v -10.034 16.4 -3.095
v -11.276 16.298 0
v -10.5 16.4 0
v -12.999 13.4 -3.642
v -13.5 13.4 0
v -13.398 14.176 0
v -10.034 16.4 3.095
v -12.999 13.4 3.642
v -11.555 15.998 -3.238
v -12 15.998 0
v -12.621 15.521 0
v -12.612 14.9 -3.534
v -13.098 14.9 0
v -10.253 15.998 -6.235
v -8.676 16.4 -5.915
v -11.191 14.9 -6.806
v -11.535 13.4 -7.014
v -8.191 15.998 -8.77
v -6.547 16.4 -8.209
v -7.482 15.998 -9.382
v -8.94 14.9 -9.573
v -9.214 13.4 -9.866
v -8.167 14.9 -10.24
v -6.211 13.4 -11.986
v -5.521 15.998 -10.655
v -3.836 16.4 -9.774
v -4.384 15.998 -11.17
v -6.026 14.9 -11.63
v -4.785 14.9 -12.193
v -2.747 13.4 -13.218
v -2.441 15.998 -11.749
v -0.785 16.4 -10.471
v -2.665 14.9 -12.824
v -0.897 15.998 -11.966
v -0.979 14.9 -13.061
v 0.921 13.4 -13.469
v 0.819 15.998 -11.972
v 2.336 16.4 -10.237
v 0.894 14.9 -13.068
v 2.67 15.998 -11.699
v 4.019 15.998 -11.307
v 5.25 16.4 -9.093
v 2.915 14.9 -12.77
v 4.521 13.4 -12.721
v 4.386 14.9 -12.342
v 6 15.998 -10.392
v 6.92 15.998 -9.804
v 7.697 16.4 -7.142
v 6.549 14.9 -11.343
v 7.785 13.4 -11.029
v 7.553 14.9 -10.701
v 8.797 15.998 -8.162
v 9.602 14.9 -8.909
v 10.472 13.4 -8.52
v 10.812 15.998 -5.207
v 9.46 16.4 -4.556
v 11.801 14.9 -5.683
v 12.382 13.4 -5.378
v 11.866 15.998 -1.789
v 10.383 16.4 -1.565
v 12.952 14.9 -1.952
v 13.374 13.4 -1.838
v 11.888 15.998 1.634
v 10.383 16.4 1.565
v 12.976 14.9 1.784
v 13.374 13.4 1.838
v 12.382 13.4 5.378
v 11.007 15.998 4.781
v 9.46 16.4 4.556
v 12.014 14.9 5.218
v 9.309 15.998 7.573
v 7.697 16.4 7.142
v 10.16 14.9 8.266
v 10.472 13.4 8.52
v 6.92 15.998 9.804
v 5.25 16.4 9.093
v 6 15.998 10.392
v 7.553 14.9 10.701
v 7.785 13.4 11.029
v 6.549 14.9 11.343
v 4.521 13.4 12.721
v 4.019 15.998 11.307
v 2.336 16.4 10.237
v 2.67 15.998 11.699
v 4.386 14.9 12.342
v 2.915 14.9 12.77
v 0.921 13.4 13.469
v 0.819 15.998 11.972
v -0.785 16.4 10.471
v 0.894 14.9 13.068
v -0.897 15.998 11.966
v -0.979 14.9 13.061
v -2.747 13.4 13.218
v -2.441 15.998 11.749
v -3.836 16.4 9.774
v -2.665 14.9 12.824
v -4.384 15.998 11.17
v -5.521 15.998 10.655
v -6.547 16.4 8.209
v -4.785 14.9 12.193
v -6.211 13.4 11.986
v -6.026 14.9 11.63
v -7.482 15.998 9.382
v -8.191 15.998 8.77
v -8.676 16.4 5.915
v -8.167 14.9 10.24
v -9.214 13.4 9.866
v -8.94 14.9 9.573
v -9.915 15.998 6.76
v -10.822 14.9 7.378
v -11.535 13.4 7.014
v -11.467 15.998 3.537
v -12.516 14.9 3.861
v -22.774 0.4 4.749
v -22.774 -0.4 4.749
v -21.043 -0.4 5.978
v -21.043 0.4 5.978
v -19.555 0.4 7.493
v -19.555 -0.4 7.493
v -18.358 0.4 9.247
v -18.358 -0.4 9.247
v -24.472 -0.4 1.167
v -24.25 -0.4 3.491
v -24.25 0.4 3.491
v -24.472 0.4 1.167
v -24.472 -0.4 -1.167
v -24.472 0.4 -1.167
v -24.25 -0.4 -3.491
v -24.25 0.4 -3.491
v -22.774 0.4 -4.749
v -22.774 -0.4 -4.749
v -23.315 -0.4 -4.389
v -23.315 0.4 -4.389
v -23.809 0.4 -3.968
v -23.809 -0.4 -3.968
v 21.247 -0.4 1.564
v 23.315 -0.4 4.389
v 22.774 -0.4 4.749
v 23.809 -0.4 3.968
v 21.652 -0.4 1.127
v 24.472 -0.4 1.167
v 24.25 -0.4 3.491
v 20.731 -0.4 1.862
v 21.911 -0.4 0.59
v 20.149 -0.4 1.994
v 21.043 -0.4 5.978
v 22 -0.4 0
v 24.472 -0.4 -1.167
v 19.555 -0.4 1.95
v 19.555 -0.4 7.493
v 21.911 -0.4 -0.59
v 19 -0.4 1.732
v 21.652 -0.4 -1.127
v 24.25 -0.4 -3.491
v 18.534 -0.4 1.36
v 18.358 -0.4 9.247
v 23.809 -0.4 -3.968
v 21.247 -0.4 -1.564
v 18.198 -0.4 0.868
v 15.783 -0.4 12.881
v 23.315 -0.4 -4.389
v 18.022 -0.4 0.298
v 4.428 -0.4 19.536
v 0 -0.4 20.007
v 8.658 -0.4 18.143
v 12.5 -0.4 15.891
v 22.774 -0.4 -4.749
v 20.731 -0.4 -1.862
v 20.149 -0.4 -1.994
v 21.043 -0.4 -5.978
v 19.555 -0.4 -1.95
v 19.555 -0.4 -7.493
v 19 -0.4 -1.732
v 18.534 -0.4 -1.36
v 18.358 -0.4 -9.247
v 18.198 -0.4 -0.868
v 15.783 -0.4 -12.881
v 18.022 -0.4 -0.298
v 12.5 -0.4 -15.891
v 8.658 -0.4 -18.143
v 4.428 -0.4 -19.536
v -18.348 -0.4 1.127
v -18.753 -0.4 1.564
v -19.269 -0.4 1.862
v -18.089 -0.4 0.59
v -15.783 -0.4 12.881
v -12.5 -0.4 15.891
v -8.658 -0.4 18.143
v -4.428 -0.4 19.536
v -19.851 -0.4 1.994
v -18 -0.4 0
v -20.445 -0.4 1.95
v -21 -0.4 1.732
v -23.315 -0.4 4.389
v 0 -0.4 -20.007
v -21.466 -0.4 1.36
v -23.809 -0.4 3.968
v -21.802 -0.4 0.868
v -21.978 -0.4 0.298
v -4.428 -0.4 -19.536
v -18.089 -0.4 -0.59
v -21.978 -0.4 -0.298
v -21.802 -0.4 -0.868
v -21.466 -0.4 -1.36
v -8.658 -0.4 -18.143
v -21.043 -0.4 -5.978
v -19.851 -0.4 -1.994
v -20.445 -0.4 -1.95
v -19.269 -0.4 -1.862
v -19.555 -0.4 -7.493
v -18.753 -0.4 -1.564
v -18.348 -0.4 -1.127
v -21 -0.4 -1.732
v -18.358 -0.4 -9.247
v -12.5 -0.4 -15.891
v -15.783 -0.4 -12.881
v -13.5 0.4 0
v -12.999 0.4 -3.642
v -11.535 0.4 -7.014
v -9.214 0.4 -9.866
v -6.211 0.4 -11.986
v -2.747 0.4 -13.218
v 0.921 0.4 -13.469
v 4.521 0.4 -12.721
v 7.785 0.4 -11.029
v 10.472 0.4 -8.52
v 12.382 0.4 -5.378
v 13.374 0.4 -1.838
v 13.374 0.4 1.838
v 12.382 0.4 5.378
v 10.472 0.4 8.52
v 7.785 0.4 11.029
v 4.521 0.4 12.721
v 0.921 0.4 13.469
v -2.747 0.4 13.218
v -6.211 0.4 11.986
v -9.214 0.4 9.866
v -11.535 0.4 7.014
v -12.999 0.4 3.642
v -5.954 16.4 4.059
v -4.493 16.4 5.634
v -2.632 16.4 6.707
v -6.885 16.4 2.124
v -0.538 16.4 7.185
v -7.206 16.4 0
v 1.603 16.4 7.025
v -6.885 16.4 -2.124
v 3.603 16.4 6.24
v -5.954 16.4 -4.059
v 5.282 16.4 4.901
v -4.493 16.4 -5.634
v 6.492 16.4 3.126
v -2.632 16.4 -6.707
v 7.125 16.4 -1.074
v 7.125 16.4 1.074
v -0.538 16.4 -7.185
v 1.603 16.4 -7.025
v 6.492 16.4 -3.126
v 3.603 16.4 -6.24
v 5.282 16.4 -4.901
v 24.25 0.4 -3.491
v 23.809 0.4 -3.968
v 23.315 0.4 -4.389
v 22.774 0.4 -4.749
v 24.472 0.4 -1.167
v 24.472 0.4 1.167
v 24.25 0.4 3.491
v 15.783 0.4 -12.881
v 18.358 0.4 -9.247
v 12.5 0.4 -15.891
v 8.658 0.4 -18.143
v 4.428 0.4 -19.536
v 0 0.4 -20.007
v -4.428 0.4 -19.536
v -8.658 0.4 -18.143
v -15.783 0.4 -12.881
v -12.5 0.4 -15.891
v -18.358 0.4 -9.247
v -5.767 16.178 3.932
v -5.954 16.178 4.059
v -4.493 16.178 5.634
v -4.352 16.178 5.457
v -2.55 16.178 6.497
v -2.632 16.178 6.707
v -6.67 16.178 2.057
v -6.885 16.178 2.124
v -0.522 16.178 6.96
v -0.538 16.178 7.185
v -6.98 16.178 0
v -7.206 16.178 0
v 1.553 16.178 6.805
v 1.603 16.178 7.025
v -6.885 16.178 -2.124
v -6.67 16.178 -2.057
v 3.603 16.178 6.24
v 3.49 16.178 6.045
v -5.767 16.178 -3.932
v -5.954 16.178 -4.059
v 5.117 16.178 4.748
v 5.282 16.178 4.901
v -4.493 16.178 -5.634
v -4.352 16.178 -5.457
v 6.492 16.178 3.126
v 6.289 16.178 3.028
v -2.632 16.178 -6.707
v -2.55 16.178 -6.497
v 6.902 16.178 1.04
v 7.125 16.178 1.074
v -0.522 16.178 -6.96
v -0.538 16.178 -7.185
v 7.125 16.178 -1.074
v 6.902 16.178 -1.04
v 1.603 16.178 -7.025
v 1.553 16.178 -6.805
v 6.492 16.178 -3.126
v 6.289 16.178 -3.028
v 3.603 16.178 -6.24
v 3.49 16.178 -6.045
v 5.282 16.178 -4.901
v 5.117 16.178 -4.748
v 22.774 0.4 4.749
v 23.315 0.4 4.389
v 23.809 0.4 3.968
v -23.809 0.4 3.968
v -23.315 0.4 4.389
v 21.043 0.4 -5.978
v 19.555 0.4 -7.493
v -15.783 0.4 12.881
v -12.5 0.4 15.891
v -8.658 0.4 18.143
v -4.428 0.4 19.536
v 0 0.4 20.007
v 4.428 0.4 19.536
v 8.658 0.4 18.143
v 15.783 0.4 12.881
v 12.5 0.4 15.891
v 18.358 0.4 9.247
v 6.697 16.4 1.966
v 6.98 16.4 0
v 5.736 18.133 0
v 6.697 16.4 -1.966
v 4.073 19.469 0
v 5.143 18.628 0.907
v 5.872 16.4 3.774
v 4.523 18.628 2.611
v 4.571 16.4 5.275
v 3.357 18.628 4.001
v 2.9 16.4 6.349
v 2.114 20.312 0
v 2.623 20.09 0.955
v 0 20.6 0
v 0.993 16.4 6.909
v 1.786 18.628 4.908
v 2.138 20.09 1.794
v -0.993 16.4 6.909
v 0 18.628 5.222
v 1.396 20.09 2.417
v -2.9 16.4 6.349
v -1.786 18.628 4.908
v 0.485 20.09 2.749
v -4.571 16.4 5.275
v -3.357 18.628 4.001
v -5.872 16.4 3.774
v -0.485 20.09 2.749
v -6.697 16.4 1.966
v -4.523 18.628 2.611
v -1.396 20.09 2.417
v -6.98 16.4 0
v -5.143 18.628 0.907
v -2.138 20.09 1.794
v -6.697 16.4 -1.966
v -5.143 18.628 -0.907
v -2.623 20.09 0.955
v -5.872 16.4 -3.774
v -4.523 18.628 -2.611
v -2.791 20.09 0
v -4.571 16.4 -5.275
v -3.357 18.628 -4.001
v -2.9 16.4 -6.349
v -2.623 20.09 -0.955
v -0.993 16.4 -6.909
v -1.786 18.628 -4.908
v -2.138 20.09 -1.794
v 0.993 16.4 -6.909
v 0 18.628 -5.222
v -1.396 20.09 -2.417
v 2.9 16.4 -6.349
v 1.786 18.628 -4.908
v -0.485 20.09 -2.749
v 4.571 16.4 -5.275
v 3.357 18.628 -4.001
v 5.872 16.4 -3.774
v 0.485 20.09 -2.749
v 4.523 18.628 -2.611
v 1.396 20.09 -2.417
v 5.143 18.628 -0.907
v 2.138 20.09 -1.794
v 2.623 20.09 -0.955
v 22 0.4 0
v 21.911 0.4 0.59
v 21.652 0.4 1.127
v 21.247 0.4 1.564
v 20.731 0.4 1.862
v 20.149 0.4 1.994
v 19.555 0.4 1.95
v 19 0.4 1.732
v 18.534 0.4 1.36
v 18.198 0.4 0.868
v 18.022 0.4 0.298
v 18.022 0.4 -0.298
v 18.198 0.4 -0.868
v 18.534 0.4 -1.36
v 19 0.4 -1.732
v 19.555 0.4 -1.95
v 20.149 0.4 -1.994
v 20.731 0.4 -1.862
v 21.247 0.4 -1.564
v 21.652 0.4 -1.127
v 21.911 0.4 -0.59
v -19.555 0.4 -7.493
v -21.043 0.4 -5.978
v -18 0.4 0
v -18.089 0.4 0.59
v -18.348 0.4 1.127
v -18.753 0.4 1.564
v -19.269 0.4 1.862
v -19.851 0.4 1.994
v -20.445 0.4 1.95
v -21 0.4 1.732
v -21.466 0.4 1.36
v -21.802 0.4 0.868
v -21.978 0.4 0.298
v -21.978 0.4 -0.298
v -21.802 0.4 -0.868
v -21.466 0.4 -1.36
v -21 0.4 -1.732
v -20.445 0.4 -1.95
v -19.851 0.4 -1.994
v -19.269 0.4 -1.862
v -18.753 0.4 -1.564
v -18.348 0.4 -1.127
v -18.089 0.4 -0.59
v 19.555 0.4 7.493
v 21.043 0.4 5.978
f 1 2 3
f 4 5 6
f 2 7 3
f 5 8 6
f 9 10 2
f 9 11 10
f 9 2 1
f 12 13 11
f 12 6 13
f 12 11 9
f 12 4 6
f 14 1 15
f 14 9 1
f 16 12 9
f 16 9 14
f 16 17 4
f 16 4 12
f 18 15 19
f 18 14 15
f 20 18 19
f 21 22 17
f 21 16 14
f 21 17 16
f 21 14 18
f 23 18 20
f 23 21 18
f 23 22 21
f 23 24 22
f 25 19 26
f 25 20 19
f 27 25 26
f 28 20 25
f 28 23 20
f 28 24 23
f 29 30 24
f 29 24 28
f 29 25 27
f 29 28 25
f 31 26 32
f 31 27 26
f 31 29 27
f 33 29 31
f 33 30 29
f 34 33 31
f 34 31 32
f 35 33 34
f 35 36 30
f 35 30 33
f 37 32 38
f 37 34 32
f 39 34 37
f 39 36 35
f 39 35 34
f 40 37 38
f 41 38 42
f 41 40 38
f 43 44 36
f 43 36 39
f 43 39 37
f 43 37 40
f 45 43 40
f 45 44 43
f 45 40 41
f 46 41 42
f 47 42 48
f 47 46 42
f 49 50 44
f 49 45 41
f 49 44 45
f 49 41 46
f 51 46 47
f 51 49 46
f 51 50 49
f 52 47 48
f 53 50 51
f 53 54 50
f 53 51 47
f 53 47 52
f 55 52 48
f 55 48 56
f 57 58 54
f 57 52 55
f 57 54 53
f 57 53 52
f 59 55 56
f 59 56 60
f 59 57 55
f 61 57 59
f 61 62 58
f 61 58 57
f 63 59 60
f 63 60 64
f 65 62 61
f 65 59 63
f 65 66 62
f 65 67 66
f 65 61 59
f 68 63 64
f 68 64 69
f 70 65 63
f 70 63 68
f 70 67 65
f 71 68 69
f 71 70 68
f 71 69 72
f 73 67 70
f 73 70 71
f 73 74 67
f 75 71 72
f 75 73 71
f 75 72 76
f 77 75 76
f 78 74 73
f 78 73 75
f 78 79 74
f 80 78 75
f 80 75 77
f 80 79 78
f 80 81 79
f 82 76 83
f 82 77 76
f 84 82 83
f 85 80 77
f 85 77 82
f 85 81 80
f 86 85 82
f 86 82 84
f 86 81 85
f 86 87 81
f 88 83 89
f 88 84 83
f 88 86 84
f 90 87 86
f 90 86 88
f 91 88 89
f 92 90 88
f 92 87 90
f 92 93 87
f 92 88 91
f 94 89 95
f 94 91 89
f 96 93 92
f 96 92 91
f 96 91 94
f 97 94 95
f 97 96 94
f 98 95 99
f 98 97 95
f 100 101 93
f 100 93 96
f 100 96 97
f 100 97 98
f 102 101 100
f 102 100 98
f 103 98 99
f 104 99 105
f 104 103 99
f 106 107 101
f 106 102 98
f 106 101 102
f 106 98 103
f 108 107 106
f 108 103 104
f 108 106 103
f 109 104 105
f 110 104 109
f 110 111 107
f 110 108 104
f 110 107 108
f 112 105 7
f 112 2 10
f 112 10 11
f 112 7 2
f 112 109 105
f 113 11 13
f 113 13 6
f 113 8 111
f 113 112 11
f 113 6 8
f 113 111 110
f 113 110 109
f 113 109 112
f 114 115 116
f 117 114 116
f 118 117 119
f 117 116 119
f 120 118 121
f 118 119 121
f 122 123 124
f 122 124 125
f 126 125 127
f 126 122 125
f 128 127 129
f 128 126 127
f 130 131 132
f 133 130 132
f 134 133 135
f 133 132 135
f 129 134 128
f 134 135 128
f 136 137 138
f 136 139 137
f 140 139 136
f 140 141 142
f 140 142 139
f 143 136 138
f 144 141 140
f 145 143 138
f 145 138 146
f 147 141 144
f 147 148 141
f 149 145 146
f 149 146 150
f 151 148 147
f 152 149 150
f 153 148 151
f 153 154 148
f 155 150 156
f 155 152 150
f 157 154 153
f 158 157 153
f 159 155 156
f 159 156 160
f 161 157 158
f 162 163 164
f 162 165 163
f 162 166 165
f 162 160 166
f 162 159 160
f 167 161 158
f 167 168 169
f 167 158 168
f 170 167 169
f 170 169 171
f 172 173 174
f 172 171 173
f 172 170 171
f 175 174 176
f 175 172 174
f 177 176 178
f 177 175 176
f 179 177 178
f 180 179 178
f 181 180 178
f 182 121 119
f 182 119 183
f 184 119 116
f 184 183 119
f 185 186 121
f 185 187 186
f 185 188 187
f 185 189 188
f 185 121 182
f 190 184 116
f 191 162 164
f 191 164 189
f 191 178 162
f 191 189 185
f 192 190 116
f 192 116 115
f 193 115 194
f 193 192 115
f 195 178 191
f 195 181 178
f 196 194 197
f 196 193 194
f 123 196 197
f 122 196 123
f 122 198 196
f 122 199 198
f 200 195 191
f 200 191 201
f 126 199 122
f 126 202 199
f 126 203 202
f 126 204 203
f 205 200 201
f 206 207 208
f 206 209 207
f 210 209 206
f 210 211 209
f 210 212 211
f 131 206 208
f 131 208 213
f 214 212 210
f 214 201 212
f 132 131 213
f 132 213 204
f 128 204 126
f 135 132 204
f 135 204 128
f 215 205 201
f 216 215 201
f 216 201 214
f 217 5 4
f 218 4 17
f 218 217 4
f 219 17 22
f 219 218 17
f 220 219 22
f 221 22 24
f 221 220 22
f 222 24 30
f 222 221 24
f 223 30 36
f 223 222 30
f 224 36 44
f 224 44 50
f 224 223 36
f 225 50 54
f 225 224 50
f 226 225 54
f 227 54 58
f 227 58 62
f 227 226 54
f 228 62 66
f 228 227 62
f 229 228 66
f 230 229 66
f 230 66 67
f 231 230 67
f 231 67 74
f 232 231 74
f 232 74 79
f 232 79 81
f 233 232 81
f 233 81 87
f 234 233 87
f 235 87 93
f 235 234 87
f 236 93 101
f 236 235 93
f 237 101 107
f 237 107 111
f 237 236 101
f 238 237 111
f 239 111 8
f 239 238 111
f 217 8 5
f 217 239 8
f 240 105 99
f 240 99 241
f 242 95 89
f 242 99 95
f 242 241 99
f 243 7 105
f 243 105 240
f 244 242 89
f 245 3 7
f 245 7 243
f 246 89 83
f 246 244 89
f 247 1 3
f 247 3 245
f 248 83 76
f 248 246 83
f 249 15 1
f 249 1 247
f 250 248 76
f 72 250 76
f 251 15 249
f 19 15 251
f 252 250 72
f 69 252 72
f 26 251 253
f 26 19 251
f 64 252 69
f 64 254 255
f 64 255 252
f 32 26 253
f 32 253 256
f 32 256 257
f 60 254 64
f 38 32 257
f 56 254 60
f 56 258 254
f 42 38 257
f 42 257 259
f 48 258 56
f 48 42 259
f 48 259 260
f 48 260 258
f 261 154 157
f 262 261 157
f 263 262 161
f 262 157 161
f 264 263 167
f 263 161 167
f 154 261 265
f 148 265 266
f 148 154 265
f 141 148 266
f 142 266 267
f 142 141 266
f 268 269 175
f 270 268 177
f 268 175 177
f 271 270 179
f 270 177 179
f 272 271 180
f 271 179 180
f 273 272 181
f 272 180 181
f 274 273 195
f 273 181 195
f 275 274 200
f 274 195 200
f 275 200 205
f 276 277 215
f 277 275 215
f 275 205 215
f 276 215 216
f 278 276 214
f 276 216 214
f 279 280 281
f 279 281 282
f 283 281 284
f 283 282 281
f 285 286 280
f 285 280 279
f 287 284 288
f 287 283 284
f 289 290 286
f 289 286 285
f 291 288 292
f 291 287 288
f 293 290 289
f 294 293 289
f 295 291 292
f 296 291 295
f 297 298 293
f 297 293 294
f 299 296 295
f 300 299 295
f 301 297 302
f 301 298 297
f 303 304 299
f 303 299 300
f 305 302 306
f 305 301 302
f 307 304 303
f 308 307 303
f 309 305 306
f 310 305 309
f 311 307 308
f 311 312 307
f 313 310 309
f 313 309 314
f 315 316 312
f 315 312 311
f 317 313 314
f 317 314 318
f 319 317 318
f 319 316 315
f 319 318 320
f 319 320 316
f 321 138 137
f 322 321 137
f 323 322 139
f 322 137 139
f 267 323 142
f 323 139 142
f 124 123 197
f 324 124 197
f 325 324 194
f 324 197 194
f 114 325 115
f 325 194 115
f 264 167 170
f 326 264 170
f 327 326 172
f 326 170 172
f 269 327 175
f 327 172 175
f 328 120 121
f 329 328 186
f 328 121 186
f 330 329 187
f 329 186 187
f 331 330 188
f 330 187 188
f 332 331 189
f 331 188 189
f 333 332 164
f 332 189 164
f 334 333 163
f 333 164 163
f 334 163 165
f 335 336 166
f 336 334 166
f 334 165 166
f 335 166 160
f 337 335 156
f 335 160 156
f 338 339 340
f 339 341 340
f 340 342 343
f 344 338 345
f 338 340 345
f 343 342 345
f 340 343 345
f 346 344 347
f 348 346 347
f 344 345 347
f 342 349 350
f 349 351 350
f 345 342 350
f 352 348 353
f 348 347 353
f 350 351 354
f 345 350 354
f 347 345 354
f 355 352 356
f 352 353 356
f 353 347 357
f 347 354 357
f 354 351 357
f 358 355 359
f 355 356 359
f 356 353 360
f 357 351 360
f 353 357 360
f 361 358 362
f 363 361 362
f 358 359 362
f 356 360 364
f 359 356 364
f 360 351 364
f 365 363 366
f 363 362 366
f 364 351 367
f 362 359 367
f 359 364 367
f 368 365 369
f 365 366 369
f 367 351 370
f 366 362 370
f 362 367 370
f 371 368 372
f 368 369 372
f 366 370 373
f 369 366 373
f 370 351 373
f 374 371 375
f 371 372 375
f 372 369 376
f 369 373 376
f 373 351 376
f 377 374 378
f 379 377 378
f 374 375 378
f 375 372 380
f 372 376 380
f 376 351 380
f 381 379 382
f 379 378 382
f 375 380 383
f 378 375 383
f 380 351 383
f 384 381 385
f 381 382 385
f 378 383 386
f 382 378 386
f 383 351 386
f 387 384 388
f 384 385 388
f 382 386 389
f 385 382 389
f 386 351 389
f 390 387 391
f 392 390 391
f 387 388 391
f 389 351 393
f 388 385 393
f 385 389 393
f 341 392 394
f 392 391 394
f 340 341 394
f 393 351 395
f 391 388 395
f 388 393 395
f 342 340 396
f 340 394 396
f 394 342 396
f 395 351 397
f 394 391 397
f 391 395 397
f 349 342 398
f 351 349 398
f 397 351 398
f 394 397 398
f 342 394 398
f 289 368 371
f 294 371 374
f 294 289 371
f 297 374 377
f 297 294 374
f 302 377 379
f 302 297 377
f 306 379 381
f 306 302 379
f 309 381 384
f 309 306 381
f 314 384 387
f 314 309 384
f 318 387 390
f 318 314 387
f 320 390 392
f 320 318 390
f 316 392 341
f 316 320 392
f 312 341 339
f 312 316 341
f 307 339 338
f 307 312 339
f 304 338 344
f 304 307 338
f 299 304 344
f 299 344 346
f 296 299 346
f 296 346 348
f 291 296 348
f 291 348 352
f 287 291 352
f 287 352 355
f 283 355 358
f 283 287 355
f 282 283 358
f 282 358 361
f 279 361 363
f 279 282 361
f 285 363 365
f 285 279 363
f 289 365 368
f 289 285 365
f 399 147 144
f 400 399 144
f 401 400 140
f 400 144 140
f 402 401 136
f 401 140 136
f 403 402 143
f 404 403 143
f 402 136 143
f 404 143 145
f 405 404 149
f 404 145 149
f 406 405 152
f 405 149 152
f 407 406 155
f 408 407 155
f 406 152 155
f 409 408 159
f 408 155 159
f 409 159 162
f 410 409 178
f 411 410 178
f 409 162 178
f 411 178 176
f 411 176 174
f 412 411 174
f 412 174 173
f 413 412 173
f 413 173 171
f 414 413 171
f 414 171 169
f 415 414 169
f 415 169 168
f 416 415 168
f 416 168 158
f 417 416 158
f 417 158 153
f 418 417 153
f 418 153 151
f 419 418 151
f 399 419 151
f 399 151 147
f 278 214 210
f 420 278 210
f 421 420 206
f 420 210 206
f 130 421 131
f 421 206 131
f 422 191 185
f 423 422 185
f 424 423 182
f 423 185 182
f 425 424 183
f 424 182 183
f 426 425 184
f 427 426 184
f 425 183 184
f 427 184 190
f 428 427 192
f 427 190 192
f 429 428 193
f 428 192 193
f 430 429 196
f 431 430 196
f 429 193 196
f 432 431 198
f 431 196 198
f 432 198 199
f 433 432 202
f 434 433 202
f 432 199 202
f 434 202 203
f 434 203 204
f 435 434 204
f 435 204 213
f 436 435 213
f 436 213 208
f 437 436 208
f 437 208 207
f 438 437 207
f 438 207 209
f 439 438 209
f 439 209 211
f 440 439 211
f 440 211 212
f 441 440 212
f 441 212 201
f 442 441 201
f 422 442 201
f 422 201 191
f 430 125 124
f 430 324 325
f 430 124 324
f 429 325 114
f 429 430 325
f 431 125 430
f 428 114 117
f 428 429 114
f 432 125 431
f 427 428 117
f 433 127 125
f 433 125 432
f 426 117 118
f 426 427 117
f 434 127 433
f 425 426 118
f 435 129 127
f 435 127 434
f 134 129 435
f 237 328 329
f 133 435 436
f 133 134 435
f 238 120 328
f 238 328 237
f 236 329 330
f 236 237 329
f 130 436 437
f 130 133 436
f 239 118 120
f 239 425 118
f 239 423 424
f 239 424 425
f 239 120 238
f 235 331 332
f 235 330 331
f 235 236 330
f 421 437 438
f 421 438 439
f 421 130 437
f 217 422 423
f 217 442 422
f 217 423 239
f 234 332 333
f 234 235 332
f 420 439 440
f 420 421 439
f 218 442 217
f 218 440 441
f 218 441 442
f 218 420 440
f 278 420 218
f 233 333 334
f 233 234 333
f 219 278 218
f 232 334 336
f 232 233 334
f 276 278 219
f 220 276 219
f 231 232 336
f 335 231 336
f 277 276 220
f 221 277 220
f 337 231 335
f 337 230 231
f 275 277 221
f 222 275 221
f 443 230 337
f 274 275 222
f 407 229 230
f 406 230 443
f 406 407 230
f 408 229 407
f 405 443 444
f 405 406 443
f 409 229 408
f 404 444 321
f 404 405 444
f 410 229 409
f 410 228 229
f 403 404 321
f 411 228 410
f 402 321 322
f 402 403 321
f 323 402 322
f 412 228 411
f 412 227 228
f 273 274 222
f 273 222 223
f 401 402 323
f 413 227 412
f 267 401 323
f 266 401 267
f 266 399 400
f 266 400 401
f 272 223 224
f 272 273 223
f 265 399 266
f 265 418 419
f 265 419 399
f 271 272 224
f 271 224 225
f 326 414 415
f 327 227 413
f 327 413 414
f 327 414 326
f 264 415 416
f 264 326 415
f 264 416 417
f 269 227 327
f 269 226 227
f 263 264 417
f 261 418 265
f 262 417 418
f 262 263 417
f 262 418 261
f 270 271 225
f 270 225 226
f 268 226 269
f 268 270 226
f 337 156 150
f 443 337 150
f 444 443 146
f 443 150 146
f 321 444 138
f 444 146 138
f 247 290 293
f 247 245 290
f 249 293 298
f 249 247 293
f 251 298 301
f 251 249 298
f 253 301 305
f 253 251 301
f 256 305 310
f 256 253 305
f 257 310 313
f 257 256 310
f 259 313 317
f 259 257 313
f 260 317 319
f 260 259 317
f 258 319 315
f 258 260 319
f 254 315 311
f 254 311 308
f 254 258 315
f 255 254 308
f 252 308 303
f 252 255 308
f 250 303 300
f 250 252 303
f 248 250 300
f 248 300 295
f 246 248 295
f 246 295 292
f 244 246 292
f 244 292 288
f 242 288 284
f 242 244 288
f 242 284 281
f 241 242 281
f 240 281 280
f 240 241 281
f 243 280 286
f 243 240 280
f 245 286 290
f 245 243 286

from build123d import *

# Parameters (mm, degrees)
FILLET_1_R          = 3
SKETCH_2_R          = 2
CUT_EXTRUDE_1_DEPTH = 10


with BuildPart() as part:
    # 草图1 → 旋转1 (revolve)
    with BuildSketch(Plane.XY):
        Polygon((0, -0.4), (0, 16.4), (-6.979971347, 16.4), (-6.979971347, 16.177681197), (-7.205553414, 16.177681197), (-7.205553414, 16.4), (-13.5, 16.4), (-13.5, 0.4), (-24.5, 0.4), (-24.5, -0.4), align=None)
    revolve(axis=Axis((0, 20.6, 0), (0, -1, 0)))

    # 草图1<3> → 旋转2 (revolve)
    with BuildSketch(Plane.XY):
        with BuildLine():
            Line((-6.979971347, 16.4), (0, 16.4))
            Line((0, 16.4), (0, 20.6))
            ThreePointArc((0, 20.6), (-4.073082371, 19.4690472), (-6.979971347, 16.4))
        make_face()
    revolve(axis=Axis((0, 20.6, 0), (0, -1, 0)))

    # 圆角1
    fillet_1_edges = [part.edges().sort_by_distance(p)[0] for p in [
        (13.5, 16.4, 0),
    ]]
    fillet(fillet_1_edges, radius=FILLET_1_R)

    # 草图2 → 切除-拉伸1 (cut)
    with BuildSketch(Plane.XZ.offset(0.4)):
        with Locations((-20, 0)):
            Circle(SKETCH_2_R)
        with Locations((20, 0)):
            Circle(SKETCH_2_R)
        with BuildLine():
            ThreePointArc((-24.25, -3.491060011), (0, -24.5), (24.25, -3.491060011))
            ThreePointArc((24.25, -3.491060011), (23.568060584, -4.185563721), (22.77437579, -4.748982941))
            ThreePointArc((22.77437579, -4.748982941), (20.265276607, -6.702825437), (18.357504114, -9.24712953))
            ThreePointArc((18.357504114, -9.24712953), (0, -20.006865782), (-18.357504114, -9.24712953))
            ThreePointArc((-18.357504114, -9.24712953), (-20.265276607, -6.702825437), (-22.77437579, -4.748982941))
            ThreePointArc((-22.77437579, -4.748982941), (-23.568060584, -4.185563721), (-24.25, -3.491060011))
        make_face()
        with BuildLine():
            ThreePointArc((22.77437579, 4.748982941), (23.568060584, 4.185563721), (24.25, 3.491060011))
            ThreePointArc((24.25, 3.491060011), (0, 24.5), (-24.25, 3.491060011))
            ThreePointArc((-24.25, 3.491060011), (-23.568060584, 4.185563721), (-22.77437579, 4.748982941))
            ThreePointArc((-22.77437579, 4.748982941), (-20.265276607, 6.702825437), (-18.357504114, 9.24712953))
            ThreePointArc((-18.357504114, 9.24712953), (0, 20.006865782), (18.357504114, 9.24712953))
            ThreePointArc((18.357504114, 9.24712953), (20.265276607, 6.702825437), (22.77437579, 4.748982941))
        make_face()
    extrude(amount=-CUT_EXTRUDE_1_DEPTH, mode=Mode.SUBTRACT)


solid = part.part
